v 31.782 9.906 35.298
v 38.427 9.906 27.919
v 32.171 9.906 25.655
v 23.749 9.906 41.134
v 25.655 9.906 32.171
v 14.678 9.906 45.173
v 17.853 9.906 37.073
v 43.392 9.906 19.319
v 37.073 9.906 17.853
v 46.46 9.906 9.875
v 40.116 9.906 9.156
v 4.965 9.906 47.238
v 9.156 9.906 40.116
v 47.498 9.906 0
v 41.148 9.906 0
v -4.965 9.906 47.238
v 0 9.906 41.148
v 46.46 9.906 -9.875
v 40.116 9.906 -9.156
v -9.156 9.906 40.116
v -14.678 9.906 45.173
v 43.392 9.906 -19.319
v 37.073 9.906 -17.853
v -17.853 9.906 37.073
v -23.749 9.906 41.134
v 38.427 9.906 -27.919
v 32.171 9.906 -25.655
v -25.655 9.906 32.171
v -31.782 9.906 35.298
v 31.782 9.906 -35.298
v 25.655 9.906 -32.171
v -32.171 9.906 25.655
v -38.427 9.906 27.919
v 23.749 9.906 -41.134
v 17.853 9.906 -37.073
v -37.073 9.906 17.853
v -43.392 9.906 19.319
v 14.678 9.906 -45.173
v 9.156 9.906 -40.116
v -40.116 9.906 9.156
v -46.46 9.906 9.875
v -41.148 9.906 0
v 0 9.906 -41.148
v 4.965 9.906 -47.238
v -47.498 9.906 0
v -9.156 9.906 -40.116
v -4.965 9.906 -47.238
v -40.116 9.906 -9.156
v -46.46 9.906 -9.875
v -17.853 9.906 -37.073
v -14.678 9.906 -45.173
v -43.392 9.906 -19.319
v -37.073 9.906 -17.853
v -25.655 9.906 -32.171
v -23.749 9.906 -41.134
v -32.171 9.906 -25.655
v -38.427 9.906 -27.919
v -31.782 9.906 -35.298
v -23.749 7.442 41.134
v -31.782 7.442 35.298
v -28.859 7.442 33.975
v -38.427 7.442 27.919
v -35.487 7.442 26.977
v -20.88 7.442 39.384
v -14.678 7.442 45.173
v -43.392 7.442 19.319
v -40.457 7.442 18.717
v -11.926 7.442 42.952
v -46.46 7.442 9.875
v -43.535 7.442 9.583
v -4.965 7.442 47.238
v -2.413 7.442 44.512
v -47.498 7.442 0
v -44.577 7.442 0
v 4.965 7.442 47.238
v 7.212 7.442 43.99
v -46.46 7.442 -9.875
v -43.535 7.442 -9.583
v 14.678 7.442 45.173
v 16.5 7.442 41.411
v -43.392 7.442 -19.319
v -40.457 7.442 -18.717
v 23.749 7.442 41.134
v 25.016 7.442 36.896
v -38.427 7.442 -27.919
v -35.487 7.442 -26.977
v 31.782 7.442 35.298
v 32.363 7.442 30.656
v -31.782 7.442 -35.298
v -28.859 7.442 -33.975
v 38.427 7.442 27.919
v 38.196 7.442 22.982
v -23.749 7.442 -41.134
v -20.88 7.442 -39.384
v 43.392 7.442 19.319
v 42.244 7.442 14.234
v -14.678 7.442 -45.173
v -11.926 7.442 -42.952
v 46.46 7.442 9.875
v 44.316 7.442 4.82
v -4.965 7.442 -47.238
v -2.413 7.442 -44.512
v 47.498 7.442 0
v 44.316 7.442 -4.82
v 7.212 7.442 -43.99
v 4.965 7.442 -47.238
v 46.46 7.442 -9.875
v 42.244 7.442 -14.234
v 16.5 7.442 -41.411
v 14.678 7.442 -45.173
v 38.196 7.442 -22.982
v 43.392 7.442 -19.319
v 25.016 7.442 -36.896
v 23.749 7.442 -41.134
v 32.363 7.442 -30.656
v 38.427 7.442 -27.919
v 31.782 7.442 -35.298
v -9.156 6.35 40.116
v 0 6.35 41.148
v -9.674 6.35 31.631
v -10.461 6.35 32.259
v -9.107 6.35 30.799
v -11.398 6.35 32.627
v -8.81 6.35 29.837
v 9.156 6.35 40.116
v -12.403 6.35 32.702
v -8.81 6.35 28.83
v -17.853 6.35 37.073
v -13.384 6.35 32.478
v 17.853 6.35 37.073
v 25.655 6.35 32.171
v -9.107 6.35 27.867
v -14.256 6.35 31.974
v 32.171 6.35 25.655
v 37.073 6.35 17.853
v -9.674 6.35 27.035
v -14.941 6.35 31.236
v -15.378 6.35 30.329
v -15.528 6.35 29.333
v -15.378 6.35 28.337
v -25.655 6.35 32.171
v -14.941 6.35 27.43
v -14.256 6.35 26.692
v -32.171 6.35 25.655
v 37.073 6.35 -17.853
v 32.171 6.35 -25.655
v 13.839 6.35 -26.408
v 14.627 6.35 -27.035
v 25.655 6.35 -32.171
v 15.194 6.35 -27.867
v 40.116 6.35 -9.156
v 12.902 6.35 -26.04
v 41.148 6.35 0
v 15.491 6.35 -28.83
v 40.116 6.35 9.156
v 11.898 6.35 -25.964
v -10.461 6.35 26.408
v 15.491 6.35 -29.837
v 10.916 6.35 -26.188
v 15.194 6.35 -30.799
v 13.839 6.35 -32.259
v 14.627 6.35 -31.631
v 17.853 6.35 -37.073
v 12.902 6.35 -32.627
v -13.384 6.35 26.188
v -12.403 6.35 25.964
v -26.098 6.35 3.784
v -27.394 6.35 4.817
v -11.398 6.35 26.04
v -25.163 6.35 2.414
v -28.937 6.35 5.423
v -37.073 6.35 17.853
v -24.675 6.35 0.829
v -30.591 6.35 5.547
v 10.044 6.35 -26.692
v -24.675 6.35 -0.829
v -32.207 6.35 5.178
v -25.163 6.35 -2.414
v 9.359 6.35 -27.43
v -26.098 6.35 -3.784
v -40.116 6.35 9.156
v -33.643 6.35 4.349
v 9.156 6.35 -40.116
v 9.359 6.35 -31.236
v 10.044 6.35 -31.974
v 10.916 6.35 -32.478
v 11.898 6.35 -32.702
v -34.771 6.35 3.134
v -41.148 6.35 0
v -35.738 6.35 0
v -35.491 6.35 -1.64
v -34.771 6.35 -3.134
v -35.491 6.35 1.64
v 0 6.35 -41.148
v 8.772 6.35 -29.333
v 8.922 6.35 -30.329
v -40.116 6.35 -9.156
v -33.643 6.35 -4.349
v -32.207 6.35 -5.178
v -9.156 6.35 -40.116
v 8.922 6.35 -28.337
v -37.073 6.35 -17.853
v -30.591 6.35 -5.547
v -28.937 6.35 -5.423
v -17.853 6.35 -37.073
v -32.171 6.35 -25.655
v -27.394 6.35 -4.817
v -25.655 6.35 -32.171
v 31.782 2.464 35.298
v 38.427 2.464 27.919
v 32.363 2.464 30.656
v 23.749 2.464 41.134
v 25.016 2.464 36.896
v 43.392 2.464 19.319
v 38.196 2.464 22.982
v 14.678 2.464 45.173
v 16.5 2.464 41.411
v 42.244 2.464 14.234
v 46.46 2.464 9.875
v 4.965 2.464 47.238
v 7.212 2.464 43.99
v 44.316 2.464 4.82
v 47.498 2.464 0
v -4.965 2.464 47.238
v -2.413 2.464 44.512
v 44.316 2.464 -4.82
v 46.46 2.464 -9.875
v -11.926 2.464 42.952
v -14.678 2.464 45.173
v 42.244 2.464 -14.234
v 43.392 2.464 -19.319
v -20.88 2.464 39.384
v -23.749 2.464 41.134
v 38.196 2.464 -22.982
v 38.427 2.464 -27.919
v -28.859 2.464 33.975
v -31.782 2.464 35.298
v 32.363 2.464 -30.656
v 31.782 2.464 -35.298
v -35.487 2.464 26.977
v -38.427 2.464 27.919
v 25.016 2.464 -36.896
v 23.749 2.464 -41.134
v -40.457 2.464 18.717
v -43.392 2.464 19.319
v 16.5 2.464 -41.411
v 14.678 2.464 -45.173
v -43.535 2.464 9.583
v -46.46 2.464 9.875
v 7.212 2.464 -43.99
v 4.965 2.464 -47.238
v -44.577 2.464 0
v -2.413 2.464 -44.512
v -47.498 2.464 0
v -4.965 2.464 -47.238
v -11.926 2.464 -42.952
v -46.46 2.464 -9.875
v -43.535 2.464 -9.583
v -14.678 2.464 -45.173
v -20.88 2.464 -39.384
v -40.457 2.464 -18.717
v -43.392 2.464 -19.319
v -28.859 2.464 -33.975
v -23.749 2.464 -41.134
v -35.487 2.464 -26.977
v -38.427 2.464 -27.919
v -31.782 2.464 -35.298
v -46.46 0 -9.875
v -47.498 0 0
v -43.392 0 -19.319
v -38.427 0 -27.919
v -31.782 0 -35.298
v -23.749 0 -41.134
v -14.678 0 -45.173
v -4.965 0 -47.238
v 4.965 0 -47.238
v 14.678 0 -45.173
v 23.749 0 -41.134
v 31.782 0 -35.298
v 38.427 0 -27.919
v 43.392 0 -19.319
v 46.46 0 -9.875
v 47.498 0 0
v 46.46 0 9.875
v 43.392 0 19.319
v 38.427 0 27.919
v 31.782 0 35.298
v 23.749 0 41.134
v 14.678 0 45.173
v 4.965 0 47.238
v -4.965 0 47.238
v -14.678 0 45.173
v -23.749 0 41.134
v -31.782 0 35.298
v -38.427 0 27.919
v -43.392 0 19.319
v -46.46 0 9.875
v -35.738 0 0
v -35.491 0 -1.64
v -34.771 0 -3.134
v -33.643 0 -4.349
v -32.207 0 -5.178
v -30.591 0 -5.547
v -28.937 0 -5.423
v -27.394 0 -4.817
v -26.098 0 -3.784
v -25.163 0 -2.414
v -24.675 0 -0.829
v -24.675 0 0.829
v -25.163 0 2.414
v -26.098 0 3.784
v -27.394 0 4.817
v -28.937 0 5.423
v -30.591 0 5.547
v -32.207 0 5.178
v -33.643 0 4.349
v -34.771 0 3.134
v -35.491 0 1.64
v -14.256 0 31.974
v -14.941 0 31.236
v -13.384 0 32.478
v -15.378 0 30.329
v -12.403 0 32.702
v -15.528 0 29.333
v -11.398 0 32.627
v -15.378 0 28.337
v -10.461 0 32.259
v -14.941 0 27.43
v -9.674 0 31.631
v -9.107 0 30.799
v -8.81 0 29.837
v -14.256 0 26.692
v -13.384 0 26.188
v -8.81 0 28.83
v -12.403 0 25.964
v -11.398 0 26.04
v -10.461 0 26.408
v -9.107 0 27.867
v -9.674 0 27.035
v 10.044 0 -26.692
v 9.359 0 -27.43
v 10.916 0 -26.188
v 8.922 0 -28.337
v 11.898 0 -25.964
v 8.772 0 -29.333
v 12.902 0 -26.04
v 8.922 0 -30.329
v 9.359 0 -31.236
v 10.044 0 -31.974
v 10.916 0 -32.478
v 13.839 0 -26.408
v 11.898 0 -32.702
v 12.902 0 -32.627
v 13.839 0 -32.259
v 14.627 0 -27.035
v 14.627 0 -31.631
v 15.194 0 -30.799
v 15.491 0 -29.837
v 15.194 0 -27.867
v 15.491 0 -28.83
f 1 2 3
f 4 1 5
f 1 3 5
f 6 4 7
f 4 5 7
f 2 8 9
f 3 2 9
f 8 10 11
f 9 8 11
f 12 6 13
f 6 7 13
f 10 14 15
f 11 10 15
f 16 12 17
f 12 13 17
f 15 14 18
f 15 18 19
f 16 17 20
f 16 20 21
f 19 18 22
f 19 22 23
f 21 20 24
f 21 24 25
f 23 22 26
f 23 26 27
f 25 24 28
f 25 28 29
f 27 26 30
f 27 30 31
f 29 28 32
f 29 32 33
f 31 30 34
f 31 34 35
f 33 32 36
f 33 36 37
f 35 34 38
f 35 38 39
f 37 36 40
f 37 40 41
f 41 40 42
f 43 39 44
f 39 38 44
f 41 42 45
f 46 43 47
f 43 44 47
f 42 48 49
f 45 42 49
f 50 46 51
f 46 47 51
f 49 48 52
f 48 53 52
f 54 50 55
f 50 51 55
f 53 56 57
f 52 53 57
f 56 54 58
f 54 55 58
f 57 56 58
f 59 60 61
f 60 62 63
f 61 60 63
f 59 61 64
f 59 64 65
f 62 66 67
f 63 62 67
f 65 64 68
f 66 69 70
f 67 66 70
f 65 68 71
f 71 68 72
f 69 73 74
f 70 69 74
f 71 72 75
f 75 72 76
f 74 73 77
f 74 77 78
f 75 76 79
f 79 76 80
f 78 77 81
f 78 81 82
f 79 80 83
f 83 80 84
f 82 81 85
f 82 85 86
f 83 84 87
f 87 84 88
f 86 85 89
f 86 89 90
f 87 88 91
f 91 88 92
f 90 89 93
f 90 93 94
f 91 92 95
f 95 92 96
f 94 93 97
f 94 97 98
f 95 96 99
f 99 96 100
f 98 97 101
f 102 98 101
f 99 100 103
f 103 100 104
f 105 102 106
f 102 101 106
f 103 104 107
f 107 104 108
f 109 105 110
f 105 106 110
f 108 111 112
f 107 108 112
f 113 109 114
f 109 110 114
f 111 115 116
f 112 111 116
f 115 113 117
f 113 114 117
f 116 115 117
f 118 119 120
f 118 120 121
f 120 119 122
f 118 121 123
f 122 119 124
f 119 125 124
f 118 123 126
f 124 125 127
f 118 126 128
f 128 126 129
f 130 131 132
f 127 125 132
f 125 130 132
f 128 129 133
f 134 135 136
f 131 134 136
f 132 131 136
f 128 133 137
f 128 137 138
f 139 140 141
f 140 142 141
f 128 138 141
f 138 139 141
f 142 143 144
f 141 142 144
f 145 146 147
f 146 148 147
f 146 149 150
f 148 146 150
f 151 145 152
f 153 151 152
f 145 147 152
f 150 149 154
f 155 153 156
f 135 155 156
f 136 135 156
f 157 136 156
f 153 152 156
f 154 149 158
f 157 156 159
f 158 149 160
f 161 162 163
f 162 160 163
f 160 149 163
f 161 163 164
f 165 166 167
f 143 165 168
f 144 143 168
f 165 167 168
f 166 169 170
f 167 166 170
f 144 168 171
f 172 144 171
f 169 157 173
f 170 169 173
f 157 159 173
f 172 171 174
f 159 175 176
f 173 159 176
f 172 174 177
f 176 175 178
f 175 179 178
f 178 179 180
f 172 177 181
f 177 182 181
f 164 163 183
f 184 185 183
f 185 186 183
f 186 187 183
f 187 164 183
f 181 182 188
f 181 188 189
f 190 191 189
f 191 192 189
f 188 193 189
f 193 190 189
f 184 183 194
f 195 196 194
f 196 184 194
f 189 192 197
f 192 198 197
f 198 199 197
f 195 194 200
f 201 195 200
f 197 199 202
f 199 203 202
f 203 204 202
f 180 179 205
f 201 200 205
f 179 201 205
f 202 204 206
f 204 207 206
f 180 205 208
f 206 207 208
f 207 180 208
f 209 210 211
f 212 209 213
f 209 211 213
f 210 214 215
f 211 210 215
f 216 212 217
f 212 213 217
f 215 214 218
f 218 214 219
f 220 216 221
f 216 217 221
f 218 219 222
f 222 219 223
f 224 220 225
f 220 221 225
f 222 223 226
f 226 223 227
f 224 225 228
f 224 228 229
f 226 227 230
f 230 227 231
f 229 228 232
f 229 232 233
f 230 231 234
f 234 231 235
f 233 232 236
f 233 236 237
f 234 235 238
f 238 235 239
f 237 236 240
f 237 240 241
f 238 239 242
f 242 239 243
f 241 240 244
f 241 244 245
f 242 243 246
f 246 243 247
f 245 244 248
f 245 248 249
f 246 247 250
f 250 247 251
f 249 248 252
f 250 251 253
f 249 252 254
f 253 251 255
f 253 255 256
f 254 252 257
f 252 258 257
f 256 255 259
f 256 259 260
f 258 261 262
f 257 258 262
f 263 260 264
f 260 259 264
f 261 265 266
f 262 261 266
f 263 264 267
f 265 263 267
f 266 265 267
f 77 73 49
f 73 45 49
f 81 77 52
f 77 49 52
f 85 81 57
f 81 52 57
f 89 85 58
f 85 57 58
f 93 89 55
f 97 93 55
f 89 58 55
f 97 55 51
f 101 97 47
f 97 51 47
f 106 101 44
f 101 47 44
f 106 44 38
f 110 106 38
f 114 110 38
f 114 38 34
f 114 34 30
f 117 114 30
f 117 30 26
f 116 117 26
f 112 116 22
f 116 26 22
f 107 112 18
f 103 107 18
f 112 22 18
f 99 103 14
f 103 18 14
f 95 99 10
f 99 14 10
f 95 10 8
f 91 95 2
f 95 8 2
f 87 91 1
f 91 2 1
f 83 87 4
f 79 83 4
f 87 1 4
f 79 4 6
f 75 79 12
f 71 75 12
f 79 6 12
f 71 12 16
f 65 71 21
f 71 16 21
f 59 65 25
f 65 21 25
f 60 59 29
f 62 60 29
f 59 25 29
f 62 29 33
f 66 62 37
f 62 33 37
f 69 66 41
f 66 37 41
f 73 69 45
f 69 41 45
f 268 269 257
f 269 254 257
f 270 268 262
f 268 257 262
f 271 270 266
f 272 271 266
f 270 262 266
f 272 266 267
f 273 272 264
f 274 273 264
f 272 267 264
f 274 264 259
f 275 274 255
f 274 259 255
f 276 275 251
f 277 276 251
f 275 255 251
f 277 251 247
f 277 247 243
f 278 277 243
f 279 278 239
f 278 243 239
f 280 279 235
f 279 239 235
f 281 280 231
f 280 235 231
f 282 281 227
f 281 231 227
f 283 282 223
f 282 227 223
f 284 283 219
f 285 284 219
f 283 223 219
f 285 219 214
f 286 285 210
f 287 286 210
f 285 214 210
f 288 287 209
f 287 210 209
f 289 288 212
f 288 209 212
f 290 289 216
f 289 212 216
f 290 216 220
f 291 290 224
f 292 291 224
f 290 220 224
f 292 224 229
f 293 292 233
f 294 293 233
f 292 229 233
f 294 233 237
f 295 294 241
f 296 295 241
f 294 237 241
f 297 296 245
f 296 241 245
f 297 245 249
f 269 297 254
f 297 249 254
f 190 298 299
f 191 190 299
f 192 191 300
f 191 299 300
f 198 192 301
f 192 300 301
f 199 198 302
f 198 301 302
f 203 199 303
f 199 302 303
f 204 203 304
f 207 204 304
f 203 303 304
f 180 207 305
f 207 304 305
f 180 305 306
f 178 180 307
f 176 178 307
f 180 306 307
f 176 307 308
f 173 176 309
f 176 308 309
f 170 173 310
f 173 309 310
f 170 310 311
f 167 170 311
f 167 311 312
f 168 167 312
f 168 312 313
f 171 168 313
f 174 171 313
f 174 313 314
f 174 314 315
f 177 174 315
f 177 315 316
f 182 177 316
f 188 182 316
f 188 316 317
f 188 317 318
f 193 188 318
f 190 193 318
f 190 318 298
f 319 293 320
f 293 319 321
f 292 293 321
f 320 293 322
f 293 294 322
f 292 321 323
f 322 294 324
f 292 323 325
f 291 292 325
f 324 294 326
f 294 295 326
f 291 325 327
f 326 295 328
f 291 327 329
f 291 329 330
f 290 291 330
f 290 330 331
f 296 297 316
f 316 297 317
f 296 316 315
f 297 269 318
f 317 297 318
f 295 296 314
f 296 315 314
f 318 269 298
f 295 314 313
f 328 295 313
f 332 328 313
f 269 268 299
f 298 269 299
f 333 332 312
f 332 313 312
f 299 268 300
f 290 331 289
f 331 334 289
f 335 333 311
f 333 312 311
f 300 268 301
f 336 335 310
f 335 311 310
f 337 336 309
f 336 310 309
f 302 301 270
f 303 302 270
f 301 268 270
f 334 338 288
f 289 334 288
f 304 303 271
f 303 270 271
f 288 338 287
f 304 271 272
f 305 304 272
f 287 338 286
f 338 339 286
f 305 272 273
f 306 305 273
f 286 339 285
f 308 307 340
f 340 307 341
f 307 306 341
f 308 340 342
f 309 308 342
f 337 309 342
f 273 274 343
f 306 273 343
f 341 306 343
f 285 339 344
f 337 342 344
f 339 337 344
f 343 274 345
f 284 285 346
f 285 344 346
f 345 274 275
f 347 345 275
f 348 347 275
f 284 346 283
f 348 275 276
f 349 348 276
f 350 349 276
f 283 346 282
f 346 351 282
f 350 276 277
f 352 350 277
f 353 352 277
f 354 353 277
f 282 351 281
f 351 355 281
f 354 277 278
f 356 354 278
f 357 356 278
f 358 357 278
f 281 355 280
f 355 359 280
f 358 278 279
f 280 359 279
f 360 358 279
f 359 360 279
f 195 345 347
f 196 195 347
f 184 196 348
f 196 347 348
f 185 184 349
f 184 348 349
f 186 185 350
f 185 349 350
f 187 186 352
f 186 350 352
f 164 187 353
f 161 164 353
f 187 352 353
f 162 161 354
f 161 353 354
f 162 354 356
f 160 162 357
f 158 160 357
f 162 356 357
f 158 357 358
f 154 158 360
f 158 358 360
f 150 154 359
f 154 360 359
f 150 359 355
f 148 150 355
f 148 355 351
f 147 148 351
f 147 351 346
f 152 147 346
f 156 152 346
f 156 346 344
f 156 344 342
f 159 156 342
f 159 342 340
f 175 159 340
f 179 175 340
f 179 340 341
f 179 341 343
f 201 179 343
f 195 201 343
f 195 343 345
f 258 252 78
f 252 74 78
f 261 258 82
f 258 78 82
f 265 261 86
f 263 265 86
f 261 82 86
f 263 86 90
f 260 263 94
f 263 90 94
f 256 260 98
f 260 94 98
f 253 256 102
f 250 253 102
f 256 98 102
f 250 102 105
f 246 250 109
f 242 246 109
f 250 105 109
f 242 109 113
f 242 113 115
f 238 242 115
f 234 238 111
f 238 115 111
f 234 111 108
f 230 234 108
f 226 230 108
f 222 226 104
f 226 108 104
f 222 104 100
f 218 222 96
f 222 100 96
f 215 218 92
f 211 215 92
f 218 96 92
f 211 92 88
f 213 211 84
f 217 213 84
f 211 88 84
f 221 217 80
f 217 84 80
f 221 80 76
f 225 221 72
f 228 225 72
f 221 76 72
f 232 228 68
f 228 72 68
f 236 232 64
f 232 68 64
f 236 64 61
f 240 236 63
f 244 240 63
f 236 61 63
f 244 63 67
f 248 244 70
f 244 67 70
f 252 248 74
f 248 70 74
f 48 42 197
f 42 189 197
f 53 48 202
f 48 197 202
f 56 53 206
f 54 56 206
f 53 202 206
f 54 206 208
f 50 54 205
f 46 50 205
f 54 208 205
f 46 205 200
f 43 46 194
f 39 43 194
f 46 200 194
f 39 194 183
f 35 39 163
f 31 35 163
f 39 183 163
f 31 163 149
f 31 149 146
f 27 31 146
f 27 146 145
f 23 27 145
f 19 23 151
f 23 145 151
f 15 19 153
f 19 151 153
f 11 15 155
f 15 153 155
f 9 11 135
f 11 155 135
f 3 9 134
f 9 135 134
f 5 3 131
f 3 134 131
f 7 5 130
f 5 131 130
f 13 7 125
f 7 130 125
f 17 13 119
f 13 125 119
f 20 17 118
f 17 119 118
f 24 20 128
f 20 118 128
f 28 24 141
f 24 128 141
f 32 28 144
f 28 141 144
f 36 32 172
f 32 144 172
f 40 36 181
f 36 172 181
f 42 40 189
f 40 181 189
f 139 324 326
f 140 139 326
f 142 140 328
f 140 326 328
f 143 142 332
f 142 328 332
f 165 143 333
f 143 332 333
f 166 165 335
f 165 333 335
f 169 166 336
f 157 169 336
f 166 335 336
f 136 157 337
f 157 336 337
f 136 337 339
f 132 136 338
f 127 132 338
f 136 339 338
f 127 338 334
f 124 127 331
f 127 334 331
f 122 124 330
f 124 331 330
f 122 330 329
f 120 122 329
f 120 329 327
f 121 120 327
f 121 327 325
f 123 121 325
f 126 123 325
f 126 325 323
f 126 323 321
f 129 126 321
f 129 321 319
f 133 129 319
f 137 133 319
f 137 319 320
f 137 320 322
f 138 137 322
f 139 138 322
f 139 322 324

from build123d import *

# Parameters (mm, degrees)
PIPE_TAP_DRILL_FOR_1_4_TAP1_D = 11.1252
F_1_4_CLEARANCE_HOLE1_D       = 6.7564
SKETCH7_R                     = 11.1125
BOSS_EXTRUDE1_DEPTH           = 6.35


with BuildPart() as part:
    # Sketch1 → Revolve1 (revolve)
    with BuildSketch(Plane.XY, mode=Mode.PRIVATE) as revolve1_sk:
        Polygon((0, 0), (47.498, 0), (47.498, 2.4638), (44.577, 2.4638), (44.577, 7.4422), (47.498, 7.4422), (47.498, 9.906), (41.148, 9.906), (41.148, 6.35), (0, 6.35), align=None)
    revolve(revolve1_sk.sketch.rotate(Axis((0, 48.192213231, 0), (0, -1, 0)), 180), axis=Axis((0, 48.192213231, 0), (0, -1, 0)))

    # Pipe Tap Drill for 1/4 Tap1 (through all)
    with Locations(Plane(origin=(0, 6.35, 0), x_dir=(1, 0, 0), z_dir=(0, 1, 0))):
        with Locations((0, 0), (-30.1752, 0)):
            Hole(PIPE_TAP_DRILL_FOR_1_4_TAP1_D / 2)

    # 1/4 Clearance Hole1 (through all)
    with Locations(Plane(origin=(0, 6.35, 0), x_dir=(1, 0, 0), z_dir=(0, 1, 0))):
        with Locations((12.150198978, 29.333175157), (-12.150198978, -29.333175157)):
            Hole(F_1_4_CLEARANCE_HOLE1_D / 2)

    # Sketch7 → Boss-Extrude1 (add)
    with BuildSketch(Plane(origin=(0, 6.35, 0), x_dir=(1, 0, 0), z_dir=(0, 1, 0))):
        Circle(SKETCH7_R)
    extrude(amount=-BOSS_EXTRUDE1_DEPTH)


solid = part.part
